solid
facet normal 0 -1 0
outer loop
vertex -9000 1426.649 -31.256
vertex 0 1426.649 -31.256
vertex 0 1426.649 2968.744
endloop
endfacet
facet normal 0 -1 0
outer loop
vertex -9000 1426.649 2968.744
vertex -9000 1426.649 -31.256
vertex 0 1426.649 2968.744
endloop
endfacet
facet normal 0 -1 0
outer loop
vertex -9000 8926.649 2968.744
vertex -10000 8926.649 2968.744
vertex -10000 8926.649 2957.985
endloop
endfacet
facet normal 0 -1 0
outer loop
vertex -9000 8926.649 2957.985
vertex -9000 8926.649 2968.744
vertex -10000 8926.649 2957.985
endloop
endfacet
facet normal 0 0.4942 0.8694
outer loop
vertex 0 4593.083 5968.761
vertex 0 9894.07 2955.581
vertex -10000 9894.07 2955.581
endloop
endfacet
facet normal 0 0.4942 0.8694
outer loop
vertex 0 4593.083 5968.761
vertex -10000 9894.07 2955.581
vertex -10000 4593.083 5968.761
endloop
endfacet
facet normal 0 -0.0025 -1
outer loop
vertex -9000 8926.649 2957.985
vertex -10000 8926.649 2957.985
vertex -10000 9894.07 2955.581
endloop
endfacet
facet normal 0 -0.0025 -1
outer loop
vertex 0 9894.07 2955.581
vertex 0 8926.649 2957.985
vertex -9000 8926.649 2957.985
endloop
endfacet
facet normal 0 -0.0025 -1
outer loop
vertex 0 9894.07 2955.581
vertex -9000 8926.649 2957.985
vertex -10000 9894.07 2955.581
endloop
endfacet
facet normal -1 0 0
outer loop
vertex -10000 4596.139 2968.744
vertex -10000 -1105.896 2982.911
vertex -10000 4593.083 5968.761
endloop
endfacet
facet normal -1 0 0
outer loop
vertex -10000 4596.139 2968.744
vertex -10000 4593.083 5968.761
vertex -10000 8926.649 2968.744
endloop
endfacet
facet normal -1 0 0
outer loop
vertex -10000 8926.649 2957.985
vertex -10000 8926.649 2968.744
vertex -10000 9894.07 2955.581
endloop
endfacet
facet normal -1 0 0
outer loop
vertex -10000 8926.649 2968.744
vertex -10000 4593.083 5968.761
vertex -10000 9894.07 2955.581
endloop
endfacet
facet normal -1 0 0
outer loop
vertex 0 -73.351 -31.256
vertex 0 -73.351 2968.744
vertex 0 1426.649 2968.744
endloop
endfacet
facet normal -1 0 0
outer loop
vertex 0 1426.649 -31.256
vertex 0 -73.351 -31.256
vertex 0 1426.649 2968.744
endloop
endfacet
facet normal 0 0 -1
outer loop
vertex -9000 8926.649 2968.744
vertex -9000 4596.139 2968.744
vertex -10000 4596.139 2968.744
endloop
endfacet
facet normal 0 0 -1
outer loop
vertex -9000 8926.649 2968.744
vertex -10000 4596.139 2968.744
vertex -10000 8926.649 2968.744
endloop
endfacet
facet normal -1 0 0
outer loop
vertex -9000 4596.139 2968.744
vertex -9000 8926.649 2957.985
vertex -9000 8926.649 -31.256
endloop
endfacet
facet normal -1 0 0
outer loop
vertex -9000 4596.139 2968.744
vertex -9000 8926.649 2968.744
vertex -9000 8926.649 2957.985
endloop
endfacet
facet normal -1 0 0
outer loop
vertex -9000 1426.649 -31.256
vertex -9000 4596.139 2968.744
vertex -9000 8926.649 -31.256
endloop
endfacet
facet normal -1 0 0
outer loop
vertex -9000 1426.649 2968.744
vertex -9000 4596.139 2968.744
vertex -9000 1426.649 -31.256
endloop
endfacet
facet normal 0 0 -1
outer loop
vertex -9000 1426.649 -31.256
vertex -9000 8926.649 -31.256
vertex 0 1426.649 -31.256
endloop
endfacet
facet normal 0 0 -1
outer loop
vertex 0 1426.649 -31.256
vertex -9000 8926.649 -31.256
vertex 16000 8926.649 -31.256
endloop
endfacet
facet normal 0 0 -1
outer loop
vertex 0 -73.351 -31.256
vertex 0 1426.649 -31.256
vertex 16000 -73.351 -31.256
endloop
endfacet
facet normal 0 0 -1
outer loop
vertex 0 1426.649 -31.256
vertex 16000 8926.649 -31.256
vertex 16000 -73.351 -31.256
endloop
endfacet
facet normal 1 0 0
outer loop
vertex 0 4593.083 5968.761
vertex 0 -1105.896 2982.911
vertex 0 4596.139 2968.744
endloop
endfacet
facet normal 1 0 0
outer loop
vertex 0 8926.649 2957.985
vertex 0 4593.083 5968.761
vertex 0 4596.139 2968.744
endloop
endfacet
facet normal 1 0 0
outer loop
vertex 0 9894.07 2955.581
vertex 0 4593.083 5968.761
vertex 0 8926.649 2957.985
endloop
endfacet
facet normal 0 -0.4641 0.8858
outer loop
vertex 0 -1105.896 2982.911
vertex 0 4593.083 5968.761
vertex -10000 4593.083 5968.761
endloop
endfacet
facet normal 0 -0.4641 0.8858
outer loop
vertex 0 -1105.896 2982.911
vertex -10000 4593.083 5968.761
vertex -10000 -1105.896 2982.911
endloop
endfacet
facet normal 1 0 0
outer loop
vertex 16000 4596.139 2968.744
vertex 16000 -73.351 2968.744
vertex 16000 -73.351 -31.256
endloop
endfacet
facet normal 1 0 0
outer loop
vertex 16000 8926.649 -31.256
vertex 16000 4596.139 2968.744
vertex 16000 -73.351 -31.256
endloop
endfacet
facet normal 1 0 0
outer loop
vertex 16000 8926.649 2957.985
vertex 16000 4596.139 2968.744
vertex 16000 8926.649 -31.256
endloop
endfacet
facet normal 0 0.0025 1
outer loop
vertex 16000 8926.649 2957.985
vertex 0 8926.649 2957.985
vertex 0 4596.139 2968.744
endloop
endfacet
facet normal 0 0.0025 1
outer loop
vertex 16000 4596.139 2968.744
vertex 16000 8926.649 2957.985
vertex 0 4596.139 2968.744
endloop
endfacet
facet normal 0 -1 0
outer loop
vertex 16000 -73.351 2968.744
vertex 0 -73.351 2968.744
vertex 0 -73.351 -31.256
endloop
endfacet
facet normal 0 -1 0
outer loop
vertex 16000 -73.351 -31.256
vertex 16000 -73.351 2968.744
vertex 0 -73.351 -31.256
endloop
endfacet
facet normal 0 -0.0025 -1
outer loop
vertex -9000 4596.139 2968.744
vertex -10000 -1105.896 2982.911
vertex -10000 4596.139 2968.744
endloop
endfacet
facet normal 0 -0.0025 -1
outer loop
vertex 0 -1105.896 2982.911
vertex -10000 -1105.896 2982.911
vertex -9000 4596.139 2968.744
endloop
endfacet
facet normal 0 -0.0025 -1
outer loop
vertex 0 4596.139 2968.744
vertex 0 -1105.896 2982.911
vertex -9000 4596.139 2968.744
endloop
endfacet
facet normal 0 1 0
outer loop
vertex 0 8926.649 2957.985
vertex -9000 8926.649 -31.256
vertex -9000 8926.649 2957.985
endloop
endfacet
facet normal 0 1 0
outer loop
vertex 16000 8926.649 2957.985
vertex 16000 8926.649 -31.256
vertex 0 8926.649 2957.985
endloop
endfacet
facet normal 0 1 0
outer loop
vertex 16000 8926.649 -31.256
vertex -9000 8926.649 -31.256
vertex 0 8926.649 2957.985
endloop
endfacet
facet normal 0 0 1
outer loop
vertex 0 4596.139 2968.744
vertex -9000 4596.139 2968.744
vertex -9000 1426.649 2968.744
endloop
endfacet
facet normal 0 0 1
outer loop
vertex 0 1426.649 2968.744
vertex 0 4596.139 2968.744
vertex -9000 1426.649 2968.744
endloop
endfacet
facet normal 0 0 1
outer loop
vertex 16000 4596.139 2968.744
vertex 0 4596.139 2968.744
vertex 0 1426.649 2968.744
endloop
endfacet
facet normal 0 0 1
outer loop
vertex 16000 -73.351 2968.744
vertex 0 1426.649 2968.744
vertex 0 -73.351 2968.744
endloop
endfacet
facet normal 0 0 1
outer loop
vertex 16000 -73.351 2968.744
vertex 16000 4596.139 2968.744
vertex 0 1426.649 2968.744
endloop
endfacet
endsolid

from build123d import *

# Parameters (mm, degrees)
F1_DEPTH = 16000
F2_W     = 7500
F2_H     = 3000
F3_DEPTH = 9000
F5_DEPTH = 10000


# Not quite as in the source:
# - the program builds the solid bodies; features that only make, move or delete a surface that nothing else refers to are left out


with BuildPart() as f1:
    # F0 (on Right) → F1 (new body)
    with BuildSketch(Plane.YZ):
        Polygon((4596.1385421307, 2968.7440507114), (-73.3513906598, 2968.7440507114), (-73.3513906598, -31.2559492886), (8926.6486093402, -31.2559492886), (8926.6486093402, 2957.9849909845), align=None)
    extrude(amount=F1_DEPTH)

    # F2 (on face) → F3 (join)
    with BuildSketch(Plane(origin=(0, 0, 0), x_dir=(0, -1, 0), z_dir=(-1, 0, 0))):
        with Locations((-5176.6486093402, 1468.7440507114)):
            Rectangle(F2_W, F2_H)
    extrude(amount=F3_DEPTH)

    # F0 (on Right) → F5 (join)
    with BuildSketch(Plane.YZ):
        Polygon((-1105.8957576752, 2982.9106330872), (4596.1385421307, 2968.7440507114), (8926.6486093402, 2968.7440507114), (8926.6486093402, 2957.9849909845), (9894.0702929946, 2955.5814524835), (4593.083292274, 5968.7609003512), align=None)
    extrude(amount=-F5_DEPTH)


solid = f1.part
